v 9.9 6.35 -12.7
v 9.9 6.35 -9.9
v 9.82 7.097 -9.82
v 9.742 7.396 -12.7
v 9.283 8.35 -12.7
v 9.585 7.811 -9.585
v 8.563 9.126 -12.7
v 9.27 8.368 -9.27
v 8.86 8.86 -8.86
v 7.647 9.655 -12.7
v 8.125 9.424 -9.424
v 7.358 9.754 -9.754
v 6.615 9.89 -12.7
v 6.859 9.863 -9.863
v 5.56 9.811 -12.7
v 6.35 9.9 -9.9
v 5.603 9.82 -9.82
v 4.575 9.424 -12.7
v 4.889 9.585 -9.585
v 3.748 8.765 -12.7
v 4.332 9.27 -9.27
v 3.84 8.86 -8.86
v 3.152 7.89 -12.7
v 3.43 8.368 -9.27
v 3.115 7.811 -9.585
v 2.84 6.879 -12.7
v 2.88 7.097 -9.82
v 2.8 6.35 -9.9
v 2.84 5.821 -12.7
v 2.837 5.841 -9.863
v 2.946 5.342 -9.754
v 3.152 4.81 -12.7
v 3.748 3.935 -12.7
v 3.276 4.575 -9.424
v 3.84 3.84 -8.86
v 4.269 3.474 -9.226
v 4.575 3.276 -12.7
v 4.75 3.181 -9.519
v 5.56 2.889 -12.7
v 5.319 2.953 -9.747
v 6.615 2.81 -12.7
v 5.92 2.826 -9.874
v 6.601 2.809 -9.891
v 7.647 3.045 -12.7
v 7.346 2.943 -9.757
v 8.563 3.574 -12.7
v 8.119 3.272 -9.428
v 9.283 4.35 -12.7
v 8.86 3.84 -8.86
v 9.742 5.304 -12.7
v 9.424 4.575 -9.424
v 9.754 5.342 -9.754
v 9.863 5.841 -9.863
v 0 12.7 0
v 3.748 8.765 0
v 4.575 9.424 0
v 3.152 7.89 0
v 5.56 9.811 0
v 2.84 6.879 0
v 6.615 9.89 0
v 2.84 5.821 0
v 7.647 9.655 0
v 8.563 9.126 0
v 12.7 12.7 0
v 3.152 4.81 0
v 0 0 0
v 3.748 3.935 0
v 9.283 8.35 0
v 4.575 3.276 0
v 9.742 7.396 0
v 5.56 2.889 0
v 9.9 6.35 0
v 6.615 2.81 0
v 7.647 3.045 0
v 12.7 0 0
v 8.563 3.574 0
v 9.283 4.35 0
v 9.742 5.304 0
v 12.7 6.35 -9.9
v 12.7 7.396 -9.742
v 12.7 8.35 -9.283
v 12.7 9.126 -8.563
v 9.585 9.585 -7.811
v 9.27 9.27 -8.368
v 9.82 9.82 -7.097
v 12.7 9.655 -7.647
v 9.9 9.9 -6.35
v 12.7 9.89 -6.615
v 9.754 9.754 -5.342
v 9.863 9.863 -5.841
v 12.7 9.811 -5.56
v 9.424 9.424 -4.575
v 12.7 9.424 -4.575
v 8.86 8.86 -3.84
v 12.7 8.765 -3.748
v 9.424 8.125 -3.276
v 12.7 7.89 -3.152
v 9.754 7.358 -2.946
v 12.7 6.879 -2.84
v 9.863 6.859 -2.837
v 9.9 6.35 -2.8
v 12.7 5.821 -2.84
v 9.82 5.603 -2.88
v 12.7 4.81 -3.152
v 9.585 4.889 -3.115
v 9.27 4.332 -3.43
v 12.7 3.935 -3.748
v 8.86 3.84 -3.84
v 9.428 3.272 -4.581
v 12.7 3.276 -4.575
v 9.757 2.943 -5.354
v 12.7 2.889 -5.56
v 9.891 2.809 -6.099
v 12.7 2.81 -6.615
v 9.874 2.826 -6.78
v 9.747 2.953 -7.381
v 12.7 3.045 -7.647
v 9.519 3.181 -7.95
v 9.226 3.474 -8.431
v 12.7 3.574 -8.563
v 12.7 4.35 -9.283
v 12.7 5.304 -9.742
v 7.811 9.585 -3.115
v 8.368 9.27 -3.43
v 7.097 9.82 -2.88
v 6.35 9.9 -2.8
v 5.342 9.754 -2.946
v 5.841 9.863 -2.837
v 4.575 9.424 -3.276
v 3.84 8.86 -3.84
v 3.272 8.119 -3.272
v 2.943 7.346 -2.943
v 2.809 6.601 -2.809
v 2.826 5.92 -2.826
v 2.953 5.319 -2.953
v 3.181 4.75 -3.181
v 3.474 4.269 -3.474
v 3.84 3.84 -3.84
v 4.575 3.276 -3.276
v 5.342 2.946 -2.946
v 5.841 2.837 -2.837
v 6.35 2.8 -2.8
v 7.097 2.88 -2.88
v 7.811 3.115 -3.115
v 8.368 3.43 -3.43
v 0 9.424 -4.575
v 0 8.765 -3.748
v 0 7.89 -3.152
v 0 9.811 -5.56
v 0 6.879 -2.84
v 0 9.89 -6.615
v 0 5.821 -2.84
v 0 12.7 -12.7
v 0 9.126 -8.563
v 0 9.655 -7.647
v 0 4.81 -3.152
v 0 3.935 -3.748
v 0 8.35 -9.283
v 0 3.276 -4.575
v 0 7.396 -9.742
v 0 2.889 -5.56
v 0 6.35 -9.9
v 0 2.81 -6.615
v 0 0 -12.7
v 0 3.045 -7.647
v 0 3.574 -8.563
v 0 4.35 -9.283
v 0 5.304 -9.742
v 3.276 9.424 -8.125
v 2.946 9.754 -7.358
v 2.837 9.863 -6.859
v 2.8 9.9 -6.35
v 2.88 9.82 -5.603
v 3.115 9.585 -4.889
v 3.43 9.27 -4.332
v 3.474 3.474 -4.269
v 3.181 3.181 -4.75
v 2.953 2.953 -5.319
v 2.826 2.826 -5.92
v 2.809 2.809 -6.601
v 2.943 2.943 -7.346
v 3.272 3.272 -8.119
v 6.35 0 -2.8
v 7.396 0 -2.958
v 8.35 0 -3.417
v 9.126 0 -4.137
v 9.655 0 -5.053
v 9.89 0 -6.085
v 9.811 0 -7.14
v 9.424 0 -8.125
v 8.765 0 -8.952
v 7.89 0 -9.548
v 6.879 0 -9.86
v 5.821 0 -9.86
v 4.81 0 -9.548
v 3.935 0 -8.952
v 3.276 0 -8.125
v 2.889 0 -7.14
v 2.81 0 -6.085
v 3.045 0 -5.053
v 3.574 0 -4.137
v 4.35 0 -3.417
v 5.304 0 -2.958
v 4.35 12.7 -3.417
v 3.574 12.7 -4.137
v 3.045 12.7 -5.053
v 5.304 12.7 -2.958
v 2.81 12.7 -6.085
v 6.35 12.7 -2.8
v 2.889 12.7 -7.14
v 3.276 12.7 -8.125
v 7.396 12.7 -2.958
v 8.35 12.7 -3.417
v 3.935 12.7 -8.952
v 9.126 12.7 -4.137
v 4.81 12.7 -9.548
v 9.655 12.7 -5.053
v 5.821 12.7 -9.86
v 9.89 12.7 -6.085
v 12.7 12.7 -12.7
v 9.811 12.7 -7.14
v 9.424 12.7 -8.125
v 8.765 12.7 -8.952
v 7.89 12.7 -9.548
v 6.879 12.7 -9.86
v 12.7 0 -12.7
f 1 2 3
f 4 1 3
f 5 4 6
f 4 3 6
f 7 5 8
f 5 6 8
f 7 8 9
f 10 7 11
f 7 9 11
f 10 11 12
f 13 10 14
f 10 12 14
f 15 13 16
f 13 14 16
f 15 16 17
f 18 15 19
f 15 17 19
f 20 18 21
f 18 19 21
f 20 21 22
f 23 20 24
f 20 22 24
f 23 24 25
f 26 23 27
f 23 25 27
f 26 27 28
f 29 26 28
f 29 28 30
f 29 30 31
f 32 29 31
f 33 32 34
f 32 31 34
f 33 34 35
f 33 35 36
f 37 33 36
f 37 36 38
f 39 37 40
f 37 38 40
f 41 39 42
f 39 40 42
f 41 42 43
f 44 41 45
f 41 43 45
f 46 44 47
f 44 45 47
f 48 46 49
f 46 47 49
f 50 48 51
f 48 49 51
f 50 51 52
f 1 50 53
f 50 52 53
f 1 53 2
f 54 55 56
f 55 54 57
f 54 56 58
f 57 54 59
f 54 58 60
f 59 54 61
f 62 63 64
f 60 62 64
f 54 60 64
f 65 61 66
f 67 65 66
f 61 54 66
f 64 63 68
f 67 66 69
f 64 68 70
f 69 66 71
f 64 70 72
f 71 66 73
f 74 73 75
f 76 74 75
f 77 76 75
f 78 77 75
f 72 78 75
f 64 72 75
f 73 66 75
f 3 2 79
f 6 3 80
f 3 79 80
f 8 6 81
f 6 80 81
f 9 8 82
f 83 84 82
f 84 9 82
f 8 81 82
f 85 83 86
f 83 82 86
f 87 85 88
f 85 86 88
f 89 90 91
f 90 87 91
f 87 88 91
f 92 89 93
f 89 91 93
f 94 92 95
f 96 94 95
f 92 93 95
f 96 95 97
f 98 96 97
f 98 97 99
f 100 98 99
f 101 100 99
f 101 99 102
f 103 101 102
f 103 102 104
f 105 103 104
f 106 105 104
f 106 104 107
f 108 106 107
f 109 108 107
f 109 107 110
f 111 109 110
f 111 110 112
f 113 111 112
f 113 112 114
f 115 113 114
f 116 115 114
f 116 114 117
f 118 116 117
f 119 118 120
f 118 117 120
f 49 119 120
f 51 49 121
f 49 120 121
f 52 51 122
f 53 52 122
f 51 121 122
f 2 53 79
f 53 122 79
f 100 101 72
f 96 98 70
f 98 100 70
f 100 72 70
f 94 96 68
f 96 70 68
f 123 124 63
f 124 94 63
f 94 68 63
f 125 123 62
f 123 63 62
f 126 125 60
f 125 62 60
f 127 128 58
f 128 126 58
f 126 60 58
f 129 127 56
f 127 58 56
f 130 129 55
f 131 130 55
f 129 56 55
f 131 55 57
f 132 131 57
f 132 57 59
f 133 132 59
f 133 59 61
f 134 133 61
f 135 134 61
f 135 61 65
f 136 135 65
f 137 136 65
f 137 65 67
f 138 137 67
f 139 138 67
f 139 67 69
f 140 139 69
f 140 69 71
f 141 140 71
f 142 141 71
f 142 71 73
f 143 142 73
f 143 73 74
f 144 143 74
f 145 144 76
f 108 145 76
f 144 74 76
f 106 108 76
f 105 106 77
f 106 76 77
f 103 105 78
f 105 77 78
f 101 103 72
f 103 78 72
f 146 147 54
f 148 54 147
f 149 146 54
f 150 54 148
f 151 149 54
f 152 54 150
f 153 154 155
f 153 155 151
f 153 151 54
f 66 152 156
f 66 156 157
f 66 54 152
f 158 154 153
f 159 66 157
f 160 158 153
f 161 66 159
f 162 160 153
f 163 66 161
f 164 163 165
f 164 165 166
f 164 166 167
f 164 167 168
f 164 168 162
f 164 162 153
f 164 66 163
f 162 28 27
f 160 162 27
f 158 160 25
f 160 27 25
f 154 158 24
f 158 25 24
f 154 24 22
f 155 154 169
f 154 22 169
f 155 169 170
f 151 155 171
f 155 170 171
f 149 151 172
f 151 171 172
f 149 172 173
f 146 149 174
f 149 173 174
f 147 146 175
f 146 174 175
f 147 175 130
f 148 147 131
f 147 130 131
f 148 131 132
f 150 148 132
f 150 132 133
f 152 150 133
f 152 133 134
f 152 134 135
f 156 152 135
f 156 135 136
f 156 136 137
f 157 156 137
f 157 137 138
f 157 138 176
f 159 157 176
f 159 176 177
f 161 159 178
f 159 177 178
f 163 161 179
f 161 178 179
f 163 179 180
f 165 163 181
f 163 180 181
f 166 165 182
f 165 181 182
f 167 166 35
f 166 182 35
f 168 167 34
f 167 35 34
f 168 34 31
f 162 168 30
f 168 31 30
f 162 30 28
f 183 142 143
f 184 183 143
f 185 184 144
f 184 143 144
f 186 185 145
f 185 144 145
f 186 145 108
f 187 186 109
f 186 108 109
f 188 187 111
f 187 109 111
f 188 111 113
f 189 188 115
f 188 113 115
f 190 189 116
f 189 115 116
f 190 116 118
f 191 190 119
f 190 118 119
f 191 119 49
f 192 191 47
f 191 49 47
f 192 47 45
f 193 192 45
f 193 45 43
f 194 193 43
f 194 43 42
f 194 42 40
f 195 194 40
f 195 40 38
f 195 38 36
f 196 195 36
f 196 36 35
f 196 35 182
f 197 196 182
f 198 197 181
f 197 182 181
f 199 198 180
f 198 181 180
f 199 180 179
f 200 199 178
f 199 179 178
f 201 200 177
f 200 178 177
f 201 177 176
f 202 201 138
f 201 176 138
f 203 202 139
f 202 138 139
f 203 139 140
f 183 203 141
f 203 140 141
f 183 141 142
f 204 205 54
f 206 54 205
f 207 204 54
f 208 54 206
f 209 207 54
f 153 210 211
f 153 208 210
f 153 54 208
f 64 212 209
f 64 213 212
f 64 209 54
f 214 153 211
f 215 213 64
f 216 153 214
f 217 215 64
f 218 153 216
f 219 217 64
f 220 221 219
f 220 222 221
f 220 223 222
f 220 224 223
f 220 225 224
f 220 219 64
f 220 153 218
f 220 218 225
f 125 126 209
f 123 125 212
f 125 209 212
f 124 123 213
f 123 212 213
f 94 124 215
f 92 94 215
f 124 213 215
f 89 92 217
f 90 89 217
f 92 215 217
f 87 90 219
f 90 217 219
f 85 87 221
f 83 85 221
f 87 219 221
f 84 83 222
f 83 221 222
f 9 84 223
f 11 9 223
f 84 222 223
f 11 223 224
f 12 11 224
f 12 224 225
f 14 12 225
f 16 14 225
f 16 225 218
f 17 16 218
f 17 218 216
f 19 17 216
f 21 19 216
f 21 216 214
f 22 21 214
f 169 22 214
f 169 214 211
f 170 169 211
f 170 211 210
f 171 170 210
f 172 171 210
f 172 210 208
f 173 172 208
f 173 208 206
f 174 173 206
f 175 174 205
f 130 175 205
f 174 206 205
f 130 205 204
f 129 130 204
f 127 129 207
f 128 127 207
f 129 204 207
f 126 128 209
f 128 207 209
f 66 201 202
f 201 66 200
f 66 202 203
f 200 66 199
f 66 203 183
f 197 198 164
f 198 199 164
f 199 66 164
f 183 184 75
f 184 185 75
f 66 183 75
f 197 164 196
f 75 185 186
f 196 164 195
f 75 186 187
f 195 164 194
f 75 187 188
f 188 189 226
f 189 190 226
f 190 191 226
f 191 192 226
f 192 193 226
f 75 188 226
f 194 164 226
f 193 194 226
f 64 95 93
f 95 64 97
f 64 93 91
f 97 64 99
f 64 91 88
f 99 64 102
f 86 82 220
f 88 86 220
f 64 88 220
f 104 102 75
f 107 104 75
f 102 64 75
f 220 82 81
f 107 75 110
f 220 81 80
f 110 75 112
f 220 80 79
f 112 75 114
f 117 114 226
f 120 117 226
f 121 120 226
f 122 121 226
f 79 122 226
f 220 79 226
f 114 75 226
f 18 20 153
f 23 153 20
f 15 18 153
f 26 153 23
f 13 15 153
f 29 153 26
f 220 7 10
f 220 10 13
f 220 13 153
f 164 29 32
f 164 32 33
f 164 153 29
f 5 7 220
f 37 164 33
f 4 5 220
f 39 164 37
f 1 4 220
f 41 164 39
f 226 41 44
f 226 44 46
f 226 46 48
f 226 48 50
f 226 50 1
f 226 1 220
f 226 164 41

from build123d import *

# Parameters (mm, degrees)
SKETCH1_W           = 12.7
SKETCH1_H           = 12.7
BOSS_EXTRUDE1_DEPTH = 12.7
SKETCH2_R           = 3.55
CUT_EXTRUDE1_DEPTH  = 22.997045256
SKETCH3_R           = 3.55
CUT_EXTRUDE2_DEPTH  = 22.997045256
SKETCH4_R           = 3.55
CUT_EXTRUDE3_DEPTH  = 22.997045256


with BuildPart() as part:
    # Sketch1 → Boss-Extrude1 (new body)
    with BuildSketch(Plane(origin=(0, 0, 0), x_dir=(1, 0, 0), z_dir=(0, 1, 0))):
        with Locations((6.35, 6.35)):
            Rectangle(SKETCH1_W, SKETCH1_H)
    extrude(amount=BOSS_EXTRUDE1_DEPTH)

    # Sketch2 → Cut-Extrude1 (cut, through all)
    with BuildSketch(Plane(origin=(0, 12.7, 0), x_dir=(1, 0, 0), z_dir=(0, 1, 0))):
        with Locations(Location((6.35, 6.35, 0), (0, 0, 270))):
            Circle(SKETCH2_R)
    extrude(amount=-CUT_EXTRUDE1_DEPTH, mode=Mode.SUBTRACT)

    # Sketch3 → Cut-Extrude2 (cut, through all)
    with BuildSketch(Plane(origin=(12.7, 0, 0), x_dir=(0, 0, -1), z_dir=(1, 0, 0))):
        with Locations((6.35, 6.35)):
            Circle(SKETCH3_R)
    extrude(amount=-CUT_EXTRUDE2_DEPTH, mode=Mode.SUBTRACT)

    # Sketch4 → Cut-Extrude3 (cut, through all)
    with BuildSketch(Plane.XY):
        with Locations((6.35, 6.35)):
            Circle(SKETCH4_R)
    extrude(amount=-CUT_EXTRUDE3_DEPTH, mode=Mode.SUBTRACT)


solid = part.part
